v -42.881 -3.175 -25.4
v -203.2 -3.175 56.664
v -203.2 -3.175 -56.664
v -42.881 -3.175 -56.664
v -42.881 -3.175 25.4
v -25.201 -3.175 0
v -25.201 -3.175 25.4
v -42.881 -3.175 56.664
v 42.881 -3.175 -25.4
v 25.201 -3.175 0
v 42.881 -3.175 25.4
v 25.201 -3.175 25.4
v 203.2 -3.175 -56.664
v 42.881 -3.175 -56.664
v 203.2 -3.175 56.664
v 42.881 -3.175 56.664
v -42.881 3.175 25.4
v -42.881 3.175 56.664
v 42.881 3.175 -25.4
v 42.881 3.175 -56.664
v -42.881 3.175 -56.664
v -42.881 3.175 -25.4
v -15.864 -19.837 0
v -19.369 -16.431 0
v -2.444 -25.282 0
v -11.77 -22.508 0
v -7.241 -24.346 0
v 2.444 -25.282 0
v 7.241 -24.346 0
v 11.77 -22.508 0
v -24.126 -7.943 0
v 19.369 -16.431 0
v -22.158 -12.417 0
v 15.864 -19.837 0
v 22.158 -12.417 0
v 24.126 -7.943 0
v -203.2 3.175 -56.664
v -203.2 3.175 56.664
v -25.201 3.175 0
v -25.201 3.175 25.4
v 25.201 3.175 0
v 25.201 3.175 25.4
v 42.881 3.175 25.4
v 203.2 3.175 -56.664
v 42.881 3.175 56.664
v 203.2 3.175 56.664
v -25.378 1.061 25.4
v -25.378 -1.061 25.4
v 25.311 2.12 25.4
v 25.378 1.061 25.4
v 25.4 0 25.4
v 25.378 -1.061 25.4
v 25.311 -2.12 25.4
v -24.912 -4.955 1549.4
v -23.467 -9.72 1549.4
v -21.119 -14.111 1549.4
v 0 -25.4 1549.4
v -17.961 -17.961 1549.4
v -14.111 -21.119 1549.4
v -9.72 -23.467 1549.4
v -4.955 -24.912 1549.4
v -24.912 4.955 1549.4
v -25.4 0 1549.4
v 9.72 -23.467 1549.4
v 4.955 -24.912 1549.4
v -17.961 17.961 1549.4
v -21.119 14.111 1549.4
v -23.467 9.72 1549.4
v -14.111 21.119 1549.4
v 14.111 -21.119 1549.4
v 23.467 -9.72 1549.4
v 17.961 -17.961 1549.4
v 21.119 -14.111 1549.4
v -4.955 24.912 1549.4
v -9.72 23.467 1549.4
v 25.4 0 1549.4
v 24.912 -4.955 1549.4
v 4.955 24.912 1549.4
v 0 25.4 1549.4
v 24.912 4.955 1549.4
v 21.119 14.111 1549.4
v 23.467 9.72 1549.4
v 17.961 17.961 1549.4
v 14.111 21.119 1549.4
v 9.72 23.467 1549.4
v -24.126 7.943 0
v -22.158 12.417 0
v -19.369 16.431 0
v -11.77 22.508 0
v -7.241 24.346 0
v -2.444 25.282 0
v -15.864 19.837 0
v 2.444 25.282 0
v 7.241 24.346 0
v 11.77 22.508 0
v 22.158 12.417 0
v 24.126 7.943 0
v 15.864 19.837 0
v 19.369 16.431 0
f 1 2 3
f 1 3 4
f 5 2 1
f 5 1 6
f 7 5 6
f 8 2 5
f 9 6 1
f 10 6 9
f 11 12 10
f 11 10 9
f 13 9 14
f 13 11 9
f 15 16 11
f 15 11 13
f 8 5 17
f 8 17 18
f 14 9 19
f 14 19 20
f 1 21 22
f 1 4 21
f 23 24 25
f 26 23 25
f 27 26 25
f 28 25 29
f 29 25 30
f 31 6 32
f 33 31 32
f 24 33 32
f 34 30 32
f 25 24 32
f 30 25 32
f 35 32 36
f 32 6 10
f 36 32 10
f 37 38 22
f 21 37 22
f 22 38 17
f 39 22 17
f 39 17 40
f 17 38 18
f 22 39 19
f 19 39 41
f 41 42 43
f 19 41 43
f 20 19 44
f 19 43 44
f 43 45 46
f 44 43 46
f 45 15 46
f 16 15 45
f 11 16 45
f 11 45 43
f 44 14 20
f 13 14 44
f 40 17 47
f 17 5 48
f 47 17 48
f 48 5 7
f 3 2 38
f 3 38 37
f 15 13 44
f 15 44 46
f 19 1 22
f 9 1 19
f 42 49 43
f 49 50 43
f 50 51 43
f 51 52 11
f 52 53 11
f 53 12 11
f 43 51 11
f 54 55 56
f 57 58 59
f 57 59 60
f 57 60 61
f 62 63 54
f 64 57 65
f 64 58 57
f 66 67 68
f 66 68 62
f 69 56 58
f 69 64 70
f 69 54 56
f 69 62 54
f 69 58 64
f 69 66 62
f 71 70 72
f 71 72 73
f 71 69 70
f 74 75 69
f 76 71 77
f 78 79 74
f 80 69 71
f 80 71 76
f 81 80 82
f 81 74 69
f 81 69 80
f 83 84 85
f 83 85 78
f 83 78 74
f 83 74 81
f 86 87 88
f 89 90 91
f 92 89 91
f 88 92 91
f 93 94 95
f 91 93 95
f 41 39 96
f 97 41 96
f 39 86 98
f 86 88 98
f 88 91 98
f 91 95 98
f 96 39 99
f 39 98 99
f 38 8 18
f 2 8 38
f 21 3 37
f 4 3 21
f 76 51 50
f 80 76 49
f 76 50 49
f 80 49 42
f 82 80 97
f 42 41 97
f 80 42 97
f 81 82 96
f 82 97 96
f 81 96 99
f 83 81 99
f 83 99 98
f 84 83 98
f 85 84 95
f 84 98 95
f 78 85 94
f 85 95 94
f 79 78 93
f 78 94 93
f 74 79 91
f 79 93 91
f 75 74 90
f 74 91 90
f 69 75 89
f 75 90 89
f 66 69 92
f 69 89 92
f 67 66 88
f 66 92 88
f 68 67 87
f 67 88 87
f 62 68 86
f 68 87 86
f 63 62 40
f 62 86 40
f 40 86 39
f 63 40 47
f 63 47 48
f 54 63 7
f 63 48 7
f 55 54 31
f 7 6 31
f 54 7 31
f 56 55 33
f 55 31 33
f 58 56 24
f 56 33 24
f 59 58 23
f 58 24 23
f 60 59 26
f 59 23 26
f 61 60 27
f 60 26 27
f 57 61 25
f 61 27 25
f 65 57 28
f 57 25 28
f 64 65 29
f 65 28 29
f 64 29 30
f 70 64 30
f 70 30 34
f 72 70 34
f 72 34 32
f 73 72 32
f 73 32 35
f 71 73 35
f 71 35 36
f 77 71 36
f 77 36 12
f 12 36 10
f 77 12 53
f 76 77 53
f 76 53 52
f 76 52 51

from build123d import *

# Parameters (mm, degrees)
F0_W     = 85.7623966645
F0_H     = 50.8
F2_DEPTH = 3.175
F1_R     = 25.4
F4_DEPTH = 1549.4


# Not quite as in the source:
# - the program builds the solid bodies; features that only make, move or delete a surface that nothing else refers to are left out


with BuildPart() as f2:
    # F0 (on Front) → F2 (new body, symmetric)
    with BuildSketch(Plane.XZ):
        Rectangle(F0_W, F0_H)
        Polygon((42.8811983322, 56.6644097805), (42.8811983322, 25.4), (42.8811983322, -25.4), (42.8811983322, -56.6644097805), (203.2, -56.6644097805), (203.2, 56.6644097805), align=None)
        Polygon((-42.8811983322, -25.4), (-42.8811983322, 25.4), (-42.8811983322, 56.6644097805), (-203.2, 56.6644097805), (-203.2, -56.6644097805), (-42.8811983322, -56.6644097805), align=None)
    extrude(amount=F2_DEPTH, both=True)

    # F1 (on Top) → F4 (join)
    with BuildSketch(Plane.XY):
        Circle(F1_R)
    extrude(amount=F4_DEPTH)


solid = f2.part
